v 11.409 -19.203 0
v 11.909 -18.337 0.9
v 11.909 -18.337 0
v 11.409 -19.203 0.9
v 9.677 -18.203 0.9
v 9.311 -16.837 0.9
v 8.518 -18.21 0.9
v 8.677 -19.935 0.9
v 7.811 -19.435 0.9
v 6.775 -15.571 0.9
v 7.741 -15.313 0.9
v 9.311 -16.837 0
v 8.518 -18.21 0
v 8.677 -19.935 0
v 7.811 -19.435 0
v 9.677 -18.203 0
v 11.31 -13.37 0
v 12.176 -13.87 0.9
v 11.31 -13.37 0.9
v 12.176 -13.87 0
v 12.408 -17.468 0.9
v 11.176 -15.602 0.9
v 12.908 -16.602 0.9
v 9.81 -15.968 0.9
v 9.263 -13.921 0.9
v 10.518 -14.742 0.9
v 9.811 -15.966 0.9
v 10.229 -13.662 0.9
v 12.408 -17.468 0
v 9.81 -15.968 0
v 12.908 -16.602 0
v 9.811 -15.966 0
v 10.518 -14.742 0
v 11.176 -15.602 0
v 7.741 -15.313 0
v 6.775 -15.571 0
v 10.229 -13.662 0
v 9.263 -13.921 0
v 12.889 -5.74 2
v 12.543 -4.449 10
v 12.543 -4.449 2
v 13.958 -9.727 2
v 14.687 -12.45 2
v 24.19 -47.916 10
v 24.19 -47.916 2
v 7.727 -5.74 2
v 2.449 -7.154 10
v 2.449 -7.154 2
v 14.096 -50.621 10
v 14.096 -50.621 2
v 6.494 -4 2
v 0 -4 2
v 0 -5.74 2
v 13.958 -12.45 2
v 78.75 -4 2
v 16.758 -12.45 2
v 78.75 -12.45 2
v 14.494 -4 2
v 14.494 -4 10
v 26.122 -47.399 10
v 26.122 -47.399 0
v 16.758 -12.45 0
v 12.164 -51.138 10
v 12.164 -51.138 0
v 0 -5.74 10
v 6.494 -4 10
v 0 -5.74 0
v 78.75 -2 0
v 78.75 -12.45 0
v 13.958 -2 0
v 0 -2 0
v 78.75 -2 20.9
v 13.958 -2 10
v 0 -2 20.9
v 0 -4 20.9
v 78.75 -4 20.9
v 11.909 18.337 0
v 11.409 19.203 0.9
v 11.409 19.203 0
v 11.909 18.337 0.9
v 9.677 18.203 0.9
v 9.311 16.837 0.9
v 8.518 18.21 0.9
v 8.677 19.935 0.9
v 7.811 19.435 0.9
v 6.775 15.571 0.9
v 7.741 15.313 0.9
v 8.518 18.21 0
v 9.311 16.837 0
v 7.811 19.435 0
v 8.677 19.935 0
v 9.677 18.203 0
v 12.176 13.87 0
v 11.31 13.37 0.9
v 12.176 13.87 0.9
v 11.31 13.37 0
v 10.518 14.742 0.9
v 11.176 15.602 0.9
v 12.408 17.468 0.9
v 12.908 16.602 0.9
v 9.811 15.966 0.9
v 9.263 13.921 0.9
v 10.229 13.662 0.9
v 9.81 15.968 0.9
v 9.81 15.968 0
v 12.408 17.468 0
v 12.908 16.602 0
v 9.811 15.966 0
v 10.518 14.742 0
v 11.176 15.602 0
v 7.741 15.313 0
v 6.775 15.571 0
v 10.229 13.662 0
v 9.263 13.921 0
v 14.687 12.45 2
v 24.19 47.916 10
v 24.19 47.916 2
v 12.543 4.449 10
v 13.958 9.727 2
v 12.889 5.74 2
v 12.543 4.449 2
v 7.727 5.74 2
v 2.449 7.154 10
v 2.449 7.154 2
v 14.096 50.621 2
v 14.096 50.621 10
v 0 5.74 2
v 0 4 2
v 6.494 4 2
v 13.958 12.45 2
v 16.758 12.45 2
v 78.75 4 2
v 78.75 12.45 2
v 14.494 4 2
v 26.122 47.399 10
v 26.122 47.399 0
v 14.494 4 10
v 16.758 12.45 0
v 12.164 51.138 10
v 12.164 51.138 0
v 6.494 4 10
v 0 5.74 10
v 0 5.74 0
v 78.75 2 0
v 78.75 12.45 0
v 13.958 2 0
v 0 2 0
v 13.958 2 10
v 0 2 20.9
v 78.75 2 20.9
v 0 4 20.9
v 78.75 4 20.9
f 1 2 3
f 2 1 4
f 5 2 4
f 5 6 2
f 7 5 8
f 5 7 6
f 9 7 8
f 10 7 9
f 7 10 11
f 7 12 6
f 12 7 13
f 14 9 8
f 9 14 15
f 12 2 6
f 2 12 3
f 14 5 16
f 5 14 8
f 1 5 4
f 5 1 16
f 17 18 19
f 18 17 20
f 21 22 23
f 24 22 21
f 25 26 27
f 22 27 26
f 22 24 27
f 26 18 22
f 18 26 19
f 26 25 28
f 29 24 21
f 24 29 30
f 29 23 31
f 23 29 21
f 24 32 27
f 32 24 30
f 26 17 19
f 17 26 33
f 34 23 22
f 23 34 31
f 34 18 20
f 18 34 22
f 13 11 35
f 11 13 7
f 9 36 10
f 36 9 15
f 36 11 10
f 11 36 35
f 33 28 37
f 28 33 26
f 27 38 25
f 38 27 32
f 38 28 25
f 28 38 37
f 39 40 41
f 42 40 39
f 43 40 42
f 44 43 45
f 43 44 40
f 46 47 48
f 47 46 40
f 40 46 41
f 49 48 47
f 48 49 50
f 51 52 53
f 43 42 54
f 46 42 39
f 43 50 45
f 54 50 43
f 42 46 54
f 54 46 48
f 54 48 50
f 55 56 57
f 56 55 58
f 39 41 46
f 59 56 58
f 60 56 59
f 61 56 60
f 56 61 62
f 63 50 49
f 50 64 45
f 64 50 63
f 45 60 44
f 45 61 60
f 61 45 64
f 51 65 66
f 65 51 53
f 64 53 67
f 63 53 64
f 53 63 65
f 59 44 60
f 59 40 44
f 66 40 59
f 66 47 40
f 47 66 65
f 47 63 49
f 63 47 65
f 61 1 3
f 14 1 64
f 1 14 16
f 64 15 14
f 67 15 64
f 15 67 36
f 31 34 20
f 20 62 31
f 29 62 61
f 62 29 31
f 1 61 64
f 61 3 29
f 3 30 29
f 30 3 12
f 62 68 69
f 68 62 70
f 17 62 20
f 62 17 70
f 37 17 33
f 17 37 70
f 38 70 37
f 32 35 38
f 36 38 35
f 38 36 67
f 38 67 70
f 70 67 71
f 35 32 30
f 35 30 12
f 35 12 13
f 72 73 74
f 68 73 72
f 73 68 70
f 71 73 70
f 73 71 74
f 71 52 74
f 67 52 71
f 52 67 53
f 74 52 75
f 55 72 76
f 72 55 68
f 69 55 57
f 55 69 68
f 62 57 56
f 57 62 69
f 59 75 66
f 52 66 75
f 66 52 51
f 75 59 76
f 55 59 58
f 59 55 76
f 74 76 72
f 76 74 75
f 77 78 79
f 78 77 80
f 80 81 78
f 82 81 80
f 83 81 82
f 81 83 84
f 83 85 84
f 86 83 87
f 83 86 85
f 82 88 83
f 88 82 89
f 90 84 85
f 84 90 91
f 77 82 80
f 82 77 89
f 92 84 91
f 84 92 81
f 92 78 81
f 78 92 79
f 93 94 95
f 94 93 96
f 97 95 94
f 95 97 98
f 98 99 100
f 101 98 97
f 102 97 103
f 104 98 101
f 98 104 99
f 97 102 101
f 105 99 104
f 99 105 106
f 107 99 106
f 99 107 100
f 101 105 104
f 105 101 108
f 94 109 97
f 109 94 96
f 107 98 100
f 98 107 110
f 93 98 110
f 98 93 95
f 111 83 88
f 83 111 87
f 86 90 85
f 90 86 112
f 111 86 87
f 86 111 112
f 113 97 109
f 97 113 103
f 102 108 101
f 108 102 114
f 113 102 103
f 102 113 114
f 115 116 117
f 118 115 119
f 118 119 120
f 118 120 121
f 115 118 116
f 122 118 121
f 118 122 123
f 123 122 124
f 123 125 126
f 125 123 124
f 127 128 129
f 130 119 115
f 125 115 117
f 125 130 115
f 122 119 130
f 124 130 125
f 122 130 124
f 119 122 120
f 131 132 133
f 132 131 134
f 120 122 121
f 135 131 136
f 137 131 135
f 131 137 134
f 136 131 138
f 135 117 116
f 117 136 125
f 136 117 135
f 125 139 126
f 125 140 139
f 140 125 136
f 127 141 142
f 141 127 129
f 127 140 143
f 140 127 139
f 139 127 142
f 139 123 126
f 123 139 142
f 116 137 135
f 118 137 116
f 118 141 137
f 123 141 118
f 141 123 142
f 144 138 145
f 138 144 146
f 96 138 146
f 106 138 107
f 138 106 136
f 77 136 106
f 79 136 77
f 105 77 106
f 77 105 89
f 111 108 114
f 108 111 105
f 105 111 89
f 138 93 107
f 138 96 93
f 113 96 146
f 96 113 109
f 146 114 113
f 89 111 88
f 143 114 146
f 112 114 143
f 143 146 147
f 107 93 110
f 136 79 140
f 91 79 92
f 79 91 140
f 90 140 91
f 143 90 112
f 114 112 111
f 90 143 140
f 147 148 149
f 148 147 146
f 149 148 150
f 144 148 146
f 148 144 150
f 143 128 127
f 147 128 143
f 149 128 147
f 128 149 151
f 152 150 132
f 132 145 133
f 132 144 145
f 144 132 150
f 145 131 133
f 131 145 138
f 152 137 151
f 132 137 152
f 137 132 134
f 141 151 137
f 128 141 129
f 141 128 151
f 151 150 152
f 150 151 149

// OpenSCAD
left=1; //Show left leg (1 or 0)
right=1; //Show right Leg (1 or 0)
angle=15; //Tilt angle from upright
depth=10.45; //tablet thickness
height=45; //Support height, 1/3 of tablet height
width=8; //bracket width, bezzel size
wall=2; //Wall thickness
ChargerHeight=0; //support lift for bottom charge port

LiftHeight=sin(angle)*(depth+wall*2); //Do not adjust
AngleLength=cos(angle)*(depth+wall*2); //Do not adjust

if (right==1)rotate([90,0,0])translate([0,0,LiftHeight+wall])RightSide();
if (left==1)mirror([0,1,0])rotate([90,0,0])translate([0,0,LiftHeight+wall])RightSide();

module RightSide(){
    translate([0,0,0]){
        rotate([0,angle,0]){
            difference(){
                cube([depth+wall*2,width+wall,height+wall+ChargerHeight]);
                union(){
                    translate([wall,wall,wall+ChargerHeight])cube([depth,width+wall,height+wall+ChargerHeight]);
                    translate([width/2,.9,height/4])rotate([90,0,0])Signature();
                }
            }
        }
    }
    translate([0,0,-LiftHeight])cube([depth*2,wall,LiftHeight]);
    translate([AngleLength,0,-LiftHeight])cube([height*1.75-AngleLength,wall,depth]);
    translate([0,0,-LiftHeight])cube([height*1.75,depth*2,wall]);
}

module Signature(){
    cube([1,4,1]);
    translate([0,4,0]){
        rotate([0,0,45])translate([0,-3,0]){
            difference(){
                cube([3,3,1]);
                translate([1,1,-1])cube([3,3,3]);
            }
        }
    }
    translate([4.95,3.29,0]){
        rotate([0,0,-45])translate([0,-3,0]){
            difference(){
                cube([3,3,1]);
                translate([1,1,-1])cube([3,3,3]);
            }
        }
    }
    translate([2.83,-0.95,0])cube([1,2.12,1]);
}
